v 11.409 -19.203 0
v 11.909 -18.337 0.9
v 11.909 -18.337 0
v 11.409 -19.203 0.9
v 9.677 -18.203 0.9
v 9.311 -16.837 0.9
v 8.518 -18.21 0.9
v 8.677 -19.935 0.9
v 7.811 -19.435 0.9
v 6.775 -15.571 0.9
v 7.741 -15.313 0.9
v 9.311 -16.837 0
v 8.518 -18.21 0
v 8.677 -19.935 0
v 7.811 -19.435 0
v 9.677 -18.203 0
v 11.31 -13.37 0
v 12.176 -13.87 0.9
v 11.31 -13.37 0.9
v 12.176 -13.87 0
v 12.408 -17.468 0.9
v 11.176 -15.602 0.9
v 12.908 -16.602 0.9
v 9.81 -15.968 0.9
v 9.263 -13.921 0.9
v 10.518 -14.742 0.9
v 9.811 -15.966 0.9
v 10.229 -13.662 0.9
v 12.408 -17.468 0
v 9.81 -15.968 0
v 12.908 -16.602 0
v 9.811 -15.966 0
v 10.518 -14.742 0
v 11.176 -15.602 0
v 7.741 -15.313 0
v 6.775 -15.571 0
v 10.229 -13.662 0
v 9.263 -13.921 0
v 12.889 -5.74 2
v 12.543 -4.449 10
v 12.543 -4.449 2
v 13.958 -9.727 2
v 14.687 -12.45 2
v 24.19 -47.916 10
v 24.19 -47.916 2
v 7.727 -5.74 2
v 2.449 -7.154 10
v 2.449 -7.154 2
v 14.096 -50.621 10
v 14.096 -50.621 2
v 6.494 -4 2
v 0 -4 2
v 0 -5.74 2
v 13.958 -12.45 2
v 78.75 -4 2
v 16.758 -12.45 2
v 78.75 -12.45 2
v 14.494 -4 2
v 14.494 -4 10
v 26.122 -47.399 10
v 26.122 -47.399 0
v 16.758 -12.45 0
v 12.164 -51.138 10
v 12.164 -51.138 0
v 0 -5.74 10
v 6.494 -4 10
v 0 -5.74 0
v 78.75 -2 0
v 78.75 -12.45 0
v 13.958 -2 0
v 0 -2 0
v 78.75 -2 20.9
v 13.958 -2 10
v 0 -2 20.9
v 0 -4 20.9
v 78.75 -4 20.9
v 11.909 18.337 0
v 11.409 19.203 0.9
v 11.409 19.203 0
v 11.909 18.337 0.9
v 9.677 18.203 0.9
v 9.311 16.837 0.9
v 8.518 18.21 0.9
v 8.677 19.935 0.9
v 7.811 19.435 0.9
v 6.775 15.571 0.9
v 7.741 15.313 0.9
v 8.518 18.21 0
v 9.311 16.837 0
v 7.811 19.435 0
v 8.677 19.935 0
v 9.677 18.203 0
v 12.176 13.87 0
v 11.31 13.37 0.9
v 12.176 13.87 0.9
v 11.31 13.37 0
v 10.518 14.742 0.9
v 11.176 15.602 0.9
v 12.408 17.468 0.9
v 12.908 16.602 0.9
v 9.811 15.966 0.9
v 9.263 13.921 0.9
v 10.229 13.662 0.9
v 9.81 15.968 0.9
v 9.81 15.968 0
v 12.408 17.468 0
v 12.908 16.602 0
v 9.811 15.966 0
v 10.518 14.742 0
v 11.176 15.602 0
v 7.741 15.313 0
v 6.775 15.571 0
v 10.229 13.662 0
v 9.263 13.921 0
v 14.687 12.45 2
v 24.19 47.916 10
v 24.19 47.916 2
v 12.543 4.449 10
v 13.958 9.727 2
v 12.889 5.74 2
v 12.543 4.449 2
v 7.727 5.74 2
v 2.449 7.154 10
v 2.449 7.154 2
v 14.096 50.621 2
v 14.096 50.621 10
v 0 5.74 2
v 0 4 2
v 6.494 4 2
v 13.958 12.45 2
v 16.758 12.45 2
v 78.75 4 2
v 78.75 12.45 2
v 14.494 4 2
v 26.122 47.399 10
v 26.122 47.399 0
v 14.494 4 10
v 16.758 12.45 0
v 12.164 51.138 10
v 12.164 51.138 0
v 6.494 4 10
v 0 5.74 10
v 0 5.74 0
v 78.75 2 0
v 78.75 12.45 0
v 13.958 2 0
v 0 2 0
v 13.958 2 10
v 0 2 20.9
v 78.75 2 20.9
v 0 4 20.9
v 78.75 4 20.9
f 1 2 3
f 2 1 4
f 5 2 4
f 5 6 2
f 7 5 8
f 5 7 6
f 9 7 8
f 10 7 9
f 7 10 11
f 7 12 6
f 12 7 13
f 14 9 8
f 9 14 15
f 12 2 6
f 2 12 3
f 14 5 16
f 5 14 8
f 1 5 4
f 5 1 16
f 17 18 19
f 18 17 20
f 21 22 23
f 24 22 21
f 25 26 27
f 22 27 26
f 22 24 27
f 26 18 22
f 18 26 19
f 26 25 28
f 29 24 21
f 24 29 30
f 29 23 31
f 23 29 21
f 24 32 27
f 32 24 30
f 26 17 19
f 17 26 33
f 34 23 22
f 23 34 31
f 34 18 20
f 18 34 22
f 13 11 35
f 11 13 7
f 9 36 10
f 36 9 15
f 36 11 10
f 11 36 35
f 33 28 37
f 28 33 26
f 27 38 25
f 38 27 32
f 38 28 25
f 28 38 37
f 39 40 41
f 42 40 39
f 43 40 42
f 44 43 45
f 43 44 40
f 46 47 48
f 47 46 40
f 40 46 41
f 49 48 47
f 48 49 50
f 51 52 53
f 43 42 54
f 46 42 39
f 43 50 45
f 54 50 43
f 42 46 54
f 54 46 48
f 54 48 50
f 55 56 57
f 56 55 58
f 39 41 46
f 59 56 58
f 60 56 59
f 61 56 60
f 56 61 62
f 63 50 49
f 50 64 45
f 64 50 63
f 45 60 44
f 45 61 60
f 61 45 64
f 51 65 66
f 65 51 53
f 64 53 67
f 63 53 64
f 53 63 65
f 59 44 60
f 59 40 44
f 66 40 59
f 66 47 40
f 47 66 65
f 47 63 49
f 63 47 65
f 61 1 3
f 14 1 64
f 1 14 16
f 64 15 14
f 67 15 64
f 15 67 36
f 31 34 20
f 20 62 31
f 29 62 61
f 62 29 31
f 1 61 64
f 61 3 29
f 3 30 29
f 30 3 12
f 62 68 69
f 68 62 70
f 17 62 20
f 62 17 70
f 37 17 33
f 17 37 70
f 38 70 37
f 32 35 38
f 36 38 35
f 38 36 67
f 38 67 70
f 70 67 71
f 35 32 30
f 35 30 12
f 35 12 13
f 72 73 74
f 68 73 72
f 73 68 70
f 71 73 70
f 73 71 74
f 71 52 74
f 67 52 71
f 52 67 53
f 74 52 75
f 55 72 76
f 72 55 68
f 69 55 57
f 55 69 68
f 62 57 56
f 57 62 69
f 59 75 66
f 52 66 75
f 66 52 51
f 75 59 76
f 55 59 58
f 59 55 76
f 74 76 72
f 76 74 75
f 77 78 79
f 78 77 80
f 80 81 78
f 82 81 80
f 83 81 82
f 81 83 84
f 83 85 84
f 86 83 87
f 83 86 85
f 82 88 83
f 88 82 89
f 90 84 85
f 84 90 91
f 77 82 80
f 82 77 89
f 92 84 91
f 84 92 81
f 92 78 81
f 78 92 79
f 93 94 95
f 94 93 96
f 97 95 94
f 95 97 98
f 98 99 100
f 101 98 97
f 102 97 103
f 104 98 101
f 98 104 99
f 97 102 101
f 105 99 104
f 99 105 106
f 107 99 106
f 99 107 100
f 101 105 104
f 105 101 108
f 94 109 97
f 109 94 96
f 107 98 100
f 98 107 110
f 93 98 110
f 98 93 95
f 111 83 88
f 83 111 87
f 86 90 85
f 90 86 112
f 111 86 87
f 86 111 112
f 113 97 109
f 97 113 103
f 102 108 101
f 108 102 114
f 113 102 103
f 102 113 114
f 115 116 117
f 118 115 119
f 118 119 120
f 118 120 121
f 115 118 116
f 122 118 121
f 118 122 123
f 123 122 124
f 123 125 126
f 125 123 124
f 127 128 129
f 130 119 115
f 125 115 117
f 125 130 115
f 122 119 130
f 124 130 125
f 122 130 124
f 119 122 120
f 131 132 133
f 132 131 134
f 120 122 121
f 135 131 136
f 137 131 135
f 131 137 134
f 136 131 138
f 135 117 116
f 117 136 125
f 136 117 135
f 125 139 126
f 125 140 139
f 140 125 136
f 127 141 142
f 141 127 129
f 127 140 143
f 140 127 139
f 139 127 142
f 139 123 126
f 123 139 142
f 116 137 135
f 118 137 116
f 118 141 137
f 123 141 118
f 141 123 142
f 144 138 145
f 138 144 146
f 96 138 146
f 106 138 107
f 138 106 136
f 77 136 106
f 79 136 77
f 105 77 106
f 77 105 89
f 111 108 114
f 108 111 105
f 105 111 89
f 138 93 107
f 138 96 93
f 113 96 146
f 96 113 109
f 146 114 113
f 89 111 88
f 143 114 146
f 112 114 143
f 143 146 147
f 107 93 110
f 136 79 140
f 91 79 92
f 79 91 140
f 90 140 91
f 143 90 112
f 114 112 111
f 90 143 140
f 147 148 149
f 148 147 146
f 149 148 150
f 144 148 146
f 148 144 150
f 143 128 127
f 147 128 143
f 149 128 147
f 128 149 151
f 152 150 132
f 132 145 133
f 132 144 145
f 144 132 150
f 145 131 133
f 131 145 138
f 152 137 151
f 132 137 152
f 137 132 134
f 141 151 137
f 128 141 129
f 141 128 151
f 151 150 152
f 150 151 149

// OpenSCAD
left=1; //Show left leg (1 or 0)
right=1; //Show right Leg (1 or 0)
angle=15; //Tilt angle from upright
depth=10.45; //tablet thickness
height=45; //Support height, 1/3 of tablet height
width=8; //bracket width, bezzel size
wall=2; //Wall thickness
ChargerHeight=0; //support lift for bottom charge port

LiftHeight=sin(angle)*(depth+wall*2); //Do not adjust
AngleLength=cos(angle)*(depth+wall*2); //Do not adjust

if (right==1)rotate([90,0,0])translate([0,0,LiftHeight+wall])RightSide();
if (left==1)mirror([0,1,0])rotate([90,0,0])translate([0,0,LiftHeight+wall])RightSide();

module RightSide(){
    translate([0,0,0]){
        rotate([0,angle,0]){
            difference(){
                cube([depth+wall*2,width+wall,height+wall+ChargerHeight]);
                union(){
                    translate([wall,wall,wall+ChargerHeight])cube([depth,width+wall,height+wall+ChargerHeight]);
                    translate([width/2,.9,height/4])rotate([90,0,0])Signature();
                }
            }
        }
    }
    translate([0,0,-LiftHeight])cube([depth*2,wall,LiftHeight]);
    translate([AngleLength,0,-LiftHeight])cube([height*1.75-AngleLength,wall,depth]);
    translate([0,0,-LiftHeight])cube([height*1.75,depth*2,wall]);
}

module Signature(){
    cube([1,4,1]);
    translate([0,4,0]){
        rotate([0,0,45])translate([0,-3,0]){
            difference(){
                cube([3,3,1]);
                translate([1,1,-1])cube([3,3,3]);
            }
        }
    }
    translate([4.95,3.29,0]){
        rotate([0,0,-45])translate([0,-3,0]){
            difference(){
                cube([3,3,1]);
                translate([1,1,-1])cube([3,3,3]);
            }
        }
    }
    translate([2.83,-0.95,0])cube([1,2.12,1]);
}
